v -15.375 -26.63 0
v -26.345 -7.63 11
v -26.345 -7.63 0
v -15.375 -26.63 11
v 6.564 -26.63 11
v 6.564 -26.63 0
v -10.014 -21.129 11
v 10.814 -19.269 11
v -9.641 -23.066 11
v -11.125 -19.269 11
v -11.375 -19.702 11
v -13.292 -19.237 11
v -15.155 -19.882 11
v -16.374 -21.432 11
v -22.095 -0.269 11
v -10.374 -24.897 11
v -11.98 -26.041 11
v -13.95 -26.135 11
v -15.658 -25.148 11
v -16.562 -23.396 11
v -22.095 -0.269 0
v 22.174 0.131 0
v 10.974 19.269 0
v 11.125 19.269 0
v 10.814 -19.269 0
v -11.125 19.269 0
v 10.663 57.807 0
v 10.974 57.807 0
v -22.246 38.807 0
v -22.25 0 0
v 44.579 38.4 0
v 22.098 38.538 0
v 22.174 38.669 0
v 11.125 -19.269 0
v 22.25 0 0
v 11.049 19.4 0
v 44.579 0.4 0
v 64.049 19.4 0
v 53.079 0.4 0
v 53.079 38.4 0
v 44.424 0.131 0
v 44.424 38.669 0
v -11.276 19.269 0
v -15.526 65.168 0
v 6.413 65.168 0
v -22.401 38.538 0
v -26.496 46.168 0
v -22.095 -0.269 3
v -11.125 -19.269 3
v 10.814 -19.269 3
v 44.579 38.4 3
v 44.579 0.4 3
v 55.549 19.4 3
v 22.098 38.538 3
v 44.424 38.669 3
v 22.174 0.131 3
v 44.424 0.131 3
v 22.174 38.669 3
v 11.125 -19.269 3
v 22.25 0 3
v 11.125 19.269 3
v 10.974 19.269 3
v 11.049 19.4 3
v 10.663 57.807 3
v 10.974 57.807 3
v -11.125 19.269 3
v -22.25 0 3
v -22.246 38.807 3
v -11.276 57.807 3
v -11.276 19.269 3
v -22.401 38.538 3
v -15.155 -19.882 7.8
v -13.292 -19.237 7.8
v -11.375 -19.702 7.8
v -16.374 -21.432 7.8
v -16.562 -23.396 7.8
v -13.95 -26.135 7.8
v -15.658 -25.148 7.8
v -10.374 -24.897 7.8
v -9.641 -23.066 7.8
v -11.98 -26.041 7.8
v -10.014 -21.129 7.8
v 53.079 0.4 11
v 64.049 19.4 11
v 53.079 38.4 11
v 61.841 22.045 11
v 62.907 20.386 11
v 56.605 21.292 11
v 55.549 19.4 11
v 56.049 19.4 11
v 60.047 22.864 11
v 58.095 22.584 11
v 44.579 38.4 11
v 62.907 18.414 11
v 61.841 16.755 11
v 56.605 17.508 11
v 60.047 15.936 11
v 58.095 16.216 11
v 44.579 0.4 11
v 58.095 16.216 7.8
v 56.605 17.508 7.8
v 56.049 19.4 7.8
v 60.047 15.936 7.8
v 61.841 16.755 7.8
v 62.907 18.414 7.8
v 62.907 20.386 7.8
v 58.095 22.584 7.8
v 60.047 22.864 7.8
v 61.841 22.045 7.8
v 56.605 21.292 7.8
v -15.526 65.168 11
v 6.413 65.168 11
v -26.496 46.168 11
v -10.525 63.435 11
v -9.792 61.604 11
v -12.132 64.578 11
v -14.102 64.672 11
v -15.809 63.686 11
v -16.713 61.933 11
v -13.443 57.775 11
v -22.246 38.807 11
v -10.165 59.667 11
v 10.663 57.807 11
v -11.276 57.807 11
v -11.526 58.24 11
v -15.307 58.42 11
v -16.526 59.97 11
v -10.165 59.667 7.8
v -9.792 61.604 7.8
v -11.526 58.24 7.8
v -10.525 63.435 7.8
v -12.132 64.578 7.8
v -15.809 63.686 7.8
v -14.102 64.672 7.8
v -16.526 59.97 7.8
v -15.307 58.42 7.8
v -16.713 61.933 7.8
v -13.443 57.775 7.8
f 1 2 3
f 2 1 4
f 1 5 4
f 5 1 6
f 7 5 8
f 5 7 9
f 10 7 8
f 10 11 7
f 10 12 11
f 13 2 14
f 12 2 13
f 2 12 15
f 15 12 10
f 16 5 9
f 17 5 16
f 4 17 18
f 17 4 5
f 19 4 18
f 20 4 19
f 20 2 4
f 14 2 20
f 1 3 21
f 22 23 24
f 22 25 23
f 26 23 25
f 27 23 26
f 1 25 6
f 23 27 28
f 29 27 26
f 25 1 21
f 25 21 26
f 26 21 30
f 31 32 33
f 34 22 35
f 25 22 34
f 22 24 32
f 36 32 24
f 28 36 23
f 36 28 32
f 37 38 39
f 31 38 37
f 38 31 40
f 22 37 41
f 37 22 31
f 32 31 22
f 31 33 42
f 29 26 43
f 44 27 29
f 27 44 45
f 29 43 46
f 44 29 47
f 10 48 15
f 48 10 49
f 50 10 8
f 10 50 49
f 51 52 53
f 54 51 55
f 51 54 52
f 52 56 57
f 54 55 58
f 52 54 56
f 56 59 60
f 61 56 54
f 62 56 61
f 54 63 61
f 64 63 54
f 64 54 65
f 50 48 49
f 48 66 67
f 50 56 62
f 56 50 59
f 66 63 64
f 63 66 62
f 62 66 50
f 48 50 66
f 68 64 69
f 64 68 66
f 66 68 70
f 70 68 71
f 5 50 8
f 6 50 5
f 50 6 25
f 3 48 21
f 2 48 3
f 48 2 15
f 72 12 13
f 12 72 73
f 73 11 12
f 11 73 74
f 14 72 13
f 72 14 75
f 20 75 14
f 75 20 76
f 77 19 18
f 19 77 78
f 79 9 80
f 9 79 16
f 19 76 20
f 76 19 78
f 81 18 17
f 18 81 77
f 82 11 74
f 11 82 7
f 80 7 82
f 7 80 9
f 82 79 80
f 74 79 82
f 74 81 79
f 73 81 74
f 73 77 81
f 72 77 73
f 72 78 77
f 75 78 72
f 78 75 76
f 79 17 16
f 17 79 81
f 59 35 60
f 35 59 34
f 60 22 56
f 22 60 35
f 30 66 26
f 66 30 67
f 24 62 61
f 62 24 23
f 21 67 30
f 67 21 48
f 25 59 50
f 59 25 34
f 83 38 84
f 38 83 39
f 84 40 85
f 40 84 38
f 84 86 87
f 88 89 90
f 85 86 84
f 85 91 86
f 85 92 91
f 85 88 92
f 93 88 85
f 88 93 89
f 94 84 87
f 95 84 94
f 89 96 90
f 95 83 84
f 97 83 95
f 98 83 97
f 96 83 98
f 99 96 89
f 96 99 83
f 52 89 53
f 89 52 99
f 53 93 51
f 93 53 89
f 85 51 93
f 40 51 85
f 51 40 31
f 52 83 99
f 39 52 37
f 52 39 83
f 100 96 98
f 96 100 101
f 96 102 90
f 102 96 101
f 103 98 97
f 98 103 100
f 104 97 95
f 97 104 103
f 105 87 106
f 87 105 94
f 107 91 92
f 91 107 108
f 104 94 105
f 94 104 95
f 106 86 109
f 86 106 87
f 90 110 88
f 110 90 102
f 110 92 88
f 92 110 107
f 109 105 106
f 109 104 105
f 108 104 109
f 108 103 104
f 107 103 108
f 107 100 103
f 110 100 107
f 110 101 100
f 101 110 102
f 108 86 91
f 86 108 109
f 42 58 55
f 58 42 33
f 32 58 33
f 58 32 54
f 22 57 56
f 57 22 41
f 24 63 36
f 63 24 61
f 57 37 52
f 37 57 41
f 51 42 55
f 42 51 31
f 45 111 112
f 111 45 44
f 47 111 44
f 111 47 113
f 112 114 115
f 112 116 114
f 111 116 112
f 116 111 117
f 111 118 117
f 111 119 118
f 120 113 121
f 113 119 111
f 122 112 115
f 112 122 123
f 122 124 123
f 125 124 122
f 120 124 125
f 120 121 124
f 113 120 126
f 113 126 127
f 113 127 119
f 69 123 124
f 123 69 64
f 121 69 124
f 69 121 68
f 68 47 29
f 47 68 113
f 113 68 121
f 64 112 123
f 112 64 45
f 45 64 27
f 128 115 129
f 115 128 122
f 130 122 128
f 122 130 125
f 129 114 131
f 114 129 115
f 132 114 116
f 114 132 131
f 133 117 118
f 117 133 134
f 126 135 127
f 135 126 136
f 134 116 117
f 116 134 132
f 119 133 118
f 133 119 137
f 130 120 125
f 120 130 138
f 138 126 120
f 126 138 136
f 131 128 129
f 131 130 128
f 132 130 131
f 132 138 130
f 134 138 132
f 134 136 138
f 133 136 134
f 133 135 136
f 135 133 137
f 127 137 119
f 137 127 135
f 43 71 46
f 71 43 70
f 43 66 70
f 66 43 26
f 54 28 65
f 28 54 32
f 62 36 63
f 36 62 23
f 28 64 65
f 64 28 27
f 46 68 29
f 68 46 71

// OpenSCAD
magnetDiameter = 7;
magnetHeight = 3.2;

hexDiameter = 44.5;
outerHexDiameterPadding = 17;
hexPileHeight = 8;
floorThickness = 3;

Hex();
translate([33.299,19.4,0])
    rotate([0,0,120])
        Hex();
rotate([0,0,240])
    translate([-33.299,-19.4,0])
        Hex();
        
module Hex()
{
    rotate([0,0,60])
    {
        union()
        {
            difference()
            {
                
                cylinder(h=hexPileHeight + floorThickness, d=hexDiameter + outerHexDiameterPadding, $fn=6);
                translate([0, 0, floorThickness])
                    cylinder(h=hexPileHeight, d=hexDiameter, $fn=6);
                translate([-11,-30, 0])
                    cube([hexDiameter + outerHexDiameterPadding, hexDiameter + outerHexDiameterPadding, hexPileHeight + floorThickness]);
                translate([-20, -29, 0])
                    cube([10, 10, hexPileHeight + floorThickness]);
                translate([-20, 19, 0])
                    cube([10, 10, hexPileHeight + floorThickness]);
                translate([-(hexDiameter + outerHexDiameterPadding)/2 + 4.5,0, hexPileHeight + floorThickness - magnetHeight])
                    cylinder(h=magnetHeight, d=magnetDiameter);
            }
            translate([0, 0, 0])
                cylinder(h=floorThickness, d=hexDiameter, $fn=6);
        }
        
    }
}
